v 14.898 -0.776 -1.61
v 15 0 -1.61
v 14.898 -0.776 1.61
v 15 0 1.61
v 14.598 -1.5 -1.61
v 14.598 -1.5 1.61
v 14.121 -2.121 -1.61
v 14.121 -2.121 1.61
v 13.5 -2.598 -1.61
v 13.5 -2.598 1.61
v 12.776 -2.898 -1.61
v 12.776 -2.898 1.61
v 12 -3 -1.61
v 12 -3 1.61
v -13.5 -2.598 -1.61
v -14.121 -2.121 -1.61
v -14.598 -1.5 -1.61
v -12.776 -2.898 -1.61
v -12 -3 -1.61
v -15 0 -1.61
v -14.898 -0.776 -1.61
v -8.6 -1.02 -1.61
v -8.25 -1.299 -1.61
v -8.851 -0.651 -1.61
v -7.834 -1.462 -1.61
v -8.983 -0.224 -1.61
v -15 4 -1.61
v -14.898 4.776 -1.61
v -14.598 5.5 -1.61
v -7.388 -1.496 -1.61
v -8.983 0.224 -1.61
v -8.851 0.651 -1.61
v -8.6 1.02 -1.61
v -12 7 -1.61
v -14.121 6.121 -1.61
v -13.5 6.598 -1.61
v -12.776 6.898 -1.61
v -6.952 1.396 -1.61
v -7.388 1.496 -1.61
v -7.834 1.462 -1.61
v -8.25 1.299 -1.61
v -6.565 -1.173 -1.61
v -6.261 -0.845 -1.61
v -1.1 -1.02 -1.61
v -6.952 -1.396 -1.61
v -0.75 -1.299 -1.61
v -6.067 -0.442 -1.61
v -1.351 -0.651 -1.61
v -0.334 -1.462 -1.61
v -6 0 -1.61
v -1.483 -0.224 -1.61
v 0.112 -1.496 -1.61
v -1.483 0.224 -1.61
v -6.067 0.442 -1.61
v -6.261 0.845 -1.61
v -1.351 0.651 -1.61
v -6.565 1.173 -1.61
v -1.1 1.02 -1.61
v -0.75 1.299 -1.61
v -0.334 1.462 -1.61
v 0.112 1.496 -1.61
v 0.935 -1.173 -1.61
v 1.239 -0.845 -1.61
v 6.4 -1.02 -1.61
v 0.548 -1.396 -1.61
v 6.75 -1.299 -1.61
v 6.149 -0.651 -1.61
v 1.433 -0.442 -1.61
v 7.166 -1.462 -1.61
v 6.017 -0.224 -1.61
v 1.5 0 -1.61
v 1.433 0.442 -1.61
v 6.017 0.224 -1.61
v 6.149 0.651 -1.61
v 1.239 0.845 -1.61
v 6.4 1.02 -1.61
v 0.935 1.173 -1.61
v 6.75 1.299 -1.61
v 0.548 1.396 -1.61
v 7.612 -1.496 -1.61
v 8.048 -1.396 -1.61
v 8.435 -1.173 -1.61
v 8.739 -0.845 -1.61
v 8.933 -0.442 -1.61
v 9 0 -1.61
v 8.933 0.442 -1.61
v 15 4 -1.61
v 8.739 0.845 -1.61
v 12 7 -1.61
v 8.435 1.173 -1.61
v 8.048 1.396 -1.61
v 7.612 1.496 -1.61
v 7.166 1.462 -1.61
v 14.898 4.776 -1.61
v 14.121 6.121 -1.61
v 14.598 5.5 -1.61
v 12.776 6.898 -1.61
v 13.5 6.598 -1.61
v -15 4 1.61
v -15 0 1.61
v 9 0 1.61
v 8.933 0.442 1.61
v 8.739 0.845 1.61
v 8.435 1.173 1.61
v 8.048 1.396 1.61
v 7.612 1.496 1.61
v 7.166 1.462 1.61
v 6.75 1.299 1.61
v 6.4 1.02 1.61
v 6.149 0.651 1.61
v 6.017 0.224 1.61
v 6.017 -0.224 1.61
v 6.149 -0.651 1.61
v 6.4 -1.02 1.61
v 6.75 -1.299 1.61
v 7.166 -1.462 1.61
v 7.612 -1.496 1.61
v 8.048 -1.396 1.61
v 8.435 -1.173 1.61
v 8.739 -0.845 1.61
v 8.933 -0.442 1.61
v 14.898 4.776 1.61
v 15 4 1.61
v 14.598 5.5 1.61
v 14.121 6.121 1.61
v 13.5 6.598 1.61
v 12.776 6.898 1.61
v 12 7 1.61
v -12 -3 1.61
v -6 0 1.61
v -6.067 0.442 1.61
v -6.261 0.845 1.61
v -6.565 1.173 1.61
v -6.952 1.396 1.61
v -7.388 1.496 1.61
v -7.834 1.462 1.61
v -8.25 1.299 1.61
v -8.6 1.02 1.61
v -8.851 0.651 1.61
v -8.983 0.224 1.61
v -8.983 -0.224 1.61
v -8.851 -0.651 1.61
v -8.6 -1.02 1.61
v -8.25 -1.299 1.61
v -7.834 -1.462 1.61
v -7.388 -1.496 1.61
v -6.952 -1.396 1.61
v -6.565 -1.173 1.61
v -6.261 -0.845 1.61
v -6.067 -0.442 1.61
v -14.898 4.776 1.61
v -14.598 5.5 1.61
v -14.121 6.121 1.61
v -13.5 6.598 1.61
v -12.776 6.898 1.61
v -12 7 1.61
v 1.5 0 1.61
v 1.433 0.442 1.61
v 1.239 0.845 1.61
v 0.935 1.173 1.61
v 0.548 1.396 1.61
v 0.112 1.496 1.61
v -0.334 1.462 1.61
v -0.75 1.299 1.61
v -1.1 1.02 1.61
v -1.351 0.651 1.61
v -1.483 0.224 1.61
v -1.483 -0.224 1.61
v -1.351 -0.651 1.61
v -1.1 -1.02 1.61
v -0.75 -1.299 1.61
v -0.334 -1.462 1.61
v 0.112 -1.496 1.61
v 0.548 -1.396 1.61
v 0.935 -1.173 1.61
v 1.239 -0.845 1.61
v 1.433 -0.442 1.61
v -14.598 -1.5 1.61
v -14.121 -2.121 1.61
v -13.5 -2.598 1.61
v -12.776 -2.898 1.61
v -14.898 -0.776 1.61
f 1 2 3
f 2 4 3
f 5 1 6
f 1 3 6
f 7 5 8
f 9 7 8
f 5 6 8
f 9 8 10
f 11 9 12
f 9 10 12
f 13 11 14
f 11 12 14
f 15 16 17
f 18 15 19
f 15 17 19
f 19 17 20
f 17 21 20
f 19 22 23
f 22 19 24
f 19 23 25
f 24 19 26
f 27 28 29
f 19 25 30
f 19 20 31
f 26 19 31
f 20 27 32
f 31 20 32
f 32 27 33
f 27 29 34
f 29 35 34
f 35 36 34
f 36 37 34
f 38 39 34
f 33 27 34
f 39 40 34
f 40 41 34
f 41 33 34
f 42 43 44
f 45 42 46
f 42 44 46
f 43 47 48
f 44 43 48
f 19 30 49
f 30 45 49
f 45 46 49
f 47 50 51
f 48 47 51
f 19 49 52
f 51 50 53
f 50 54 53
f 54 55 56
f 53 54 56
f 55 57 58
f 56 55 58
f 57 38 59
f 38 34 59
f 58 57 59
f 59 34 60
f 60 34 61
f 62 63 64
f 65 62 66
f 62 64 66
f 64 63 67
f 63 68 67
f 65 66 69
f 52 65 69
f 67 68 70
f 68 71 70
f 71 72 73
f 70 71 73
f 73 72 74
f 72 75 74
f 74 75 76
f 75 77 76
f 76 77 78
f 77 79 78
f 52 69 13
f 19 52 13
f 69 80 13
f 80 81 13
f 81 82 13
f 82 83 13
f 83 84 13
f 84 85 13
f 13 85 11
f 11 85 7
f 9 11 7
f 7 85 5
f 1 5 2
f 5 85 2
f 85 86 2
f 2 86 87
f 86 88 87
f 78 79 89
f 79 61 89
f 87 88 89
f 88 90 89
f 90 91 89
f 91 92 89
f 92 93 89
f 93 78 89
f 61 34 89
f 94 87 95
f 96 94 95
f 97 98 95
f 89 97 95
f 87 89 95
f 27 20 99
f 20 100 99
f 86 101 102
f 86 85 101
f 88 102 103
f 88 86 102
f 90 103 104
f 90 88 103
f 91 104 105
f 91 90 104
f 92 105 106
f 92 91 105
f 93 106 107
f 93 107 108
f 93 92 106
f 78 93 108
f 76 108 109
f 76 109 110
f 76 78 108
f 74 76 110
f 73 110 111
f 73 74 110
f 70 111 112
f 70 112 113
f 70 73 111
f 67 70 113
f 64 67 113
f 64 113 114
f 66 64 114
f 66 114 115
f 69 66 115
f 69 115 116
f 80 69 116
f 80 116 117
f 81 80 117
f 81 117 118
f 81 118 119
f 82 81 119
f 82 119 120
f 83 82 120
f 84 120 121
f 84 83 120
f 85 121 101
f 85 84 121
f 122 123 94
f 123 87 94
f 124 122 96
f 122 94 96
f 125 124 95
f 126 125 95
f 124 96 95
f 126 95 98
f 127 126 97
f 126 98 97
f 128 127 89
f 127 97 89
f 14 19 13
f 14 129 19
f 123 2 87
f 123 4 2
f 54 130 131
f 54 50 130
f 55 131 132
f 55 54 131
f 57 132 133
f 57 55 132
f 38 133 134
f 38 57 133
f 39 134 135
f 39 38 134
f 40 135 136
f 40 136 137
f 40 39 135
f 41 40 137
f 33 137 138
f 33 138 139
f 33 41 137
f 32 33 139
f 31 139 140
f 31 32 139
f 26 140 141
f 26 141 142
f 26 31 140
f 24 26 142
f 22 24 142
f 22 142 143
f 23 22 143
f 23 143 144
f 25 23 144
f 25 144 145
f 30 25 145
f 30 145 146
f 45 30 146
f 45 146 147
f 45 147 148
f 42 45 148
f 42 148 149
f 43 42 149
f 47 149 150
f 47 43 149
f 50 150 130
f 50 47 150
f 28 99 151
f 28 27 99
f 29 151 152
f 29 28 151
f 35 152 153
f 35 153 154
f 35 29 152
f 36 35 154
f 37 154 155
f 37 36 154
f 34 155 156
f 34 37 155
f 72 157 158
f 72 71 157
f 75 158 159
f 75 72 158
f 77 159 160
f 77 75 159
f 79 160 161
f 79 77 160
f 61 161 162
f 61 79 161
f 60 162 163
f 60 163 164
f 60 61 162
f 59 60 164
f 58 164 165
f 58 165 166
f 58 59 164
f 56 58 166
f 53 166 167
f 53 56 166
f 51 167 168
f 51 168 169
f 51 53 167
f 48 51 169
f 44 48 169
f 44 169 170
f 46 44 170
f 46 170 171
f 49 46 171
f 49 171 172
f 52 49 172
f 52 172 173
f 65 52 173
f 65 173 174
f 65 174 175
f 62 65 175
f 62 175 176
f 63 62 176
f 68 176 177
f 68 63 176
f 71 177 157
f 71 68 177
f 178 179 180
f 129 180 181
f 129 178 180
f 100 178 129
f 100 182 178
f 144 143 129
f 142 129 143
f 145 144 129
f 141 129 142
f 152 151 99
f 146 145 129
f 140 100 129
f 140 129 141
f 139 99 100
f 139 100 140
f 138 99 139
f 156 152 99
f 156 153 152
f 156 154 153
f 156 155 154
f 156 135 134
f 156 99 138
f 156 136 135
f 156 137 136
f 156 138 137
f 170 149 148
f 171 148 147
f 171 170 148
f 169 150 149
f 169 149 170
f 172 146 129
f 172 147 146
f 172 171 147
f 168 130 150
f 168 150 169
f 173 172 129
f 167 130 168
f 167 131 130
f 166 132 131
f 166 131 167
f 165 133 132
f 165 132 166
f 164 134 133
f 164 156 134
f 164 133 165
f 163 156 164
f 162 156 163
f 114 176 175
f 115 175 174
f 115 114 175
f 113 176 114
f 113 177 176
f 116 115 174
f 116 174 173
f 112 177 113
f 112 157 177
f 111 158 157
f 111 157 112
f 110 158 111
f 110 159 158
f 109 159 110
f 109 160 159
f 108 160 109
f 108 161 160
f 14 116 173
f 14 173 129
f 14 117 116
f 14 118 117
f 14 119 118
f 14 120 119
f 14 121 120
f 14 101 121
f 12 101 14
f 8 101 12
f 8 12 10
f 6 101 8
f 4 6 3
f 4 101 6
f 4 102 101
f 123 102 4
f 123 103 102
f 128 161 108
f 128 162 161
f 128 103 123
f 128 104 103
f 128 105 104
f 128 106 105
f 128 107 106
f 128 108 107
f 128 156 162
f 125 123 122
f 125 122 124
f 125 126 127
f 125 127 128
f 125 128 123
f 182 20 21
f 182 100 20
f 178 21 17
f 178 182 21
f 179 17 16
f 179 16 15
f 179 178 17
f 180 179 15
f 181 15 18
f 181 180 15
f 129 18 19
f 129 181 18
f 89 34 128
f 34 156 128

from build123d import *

# Parameters (mm, degrees)
SKETCH1_W           = 30
SKETCH1_H           = 10
SKETCH1_R           = 1.5
BOSS_EXTRUDE1_DEPTH = 1.61
FILLET1_R           = 3


with BuildPart() as part:
    # Sketch1 → Boss-Extrude1 (new body, symmetric)
    with BuildSketch(Plane.XY):
        with Locations((0, 2)):
            Rectangle(SKETCH1_W, SKETCH1_H)
        with Locations((-7.5, 0)):
            Circle(SKETCH1_R, mode=Mode.SUBTRACT)
        Circle(SKETCH1_R, mode=Mode.SUBTRACT)
        with Locations((7.5, 0)):
            Circle(SKETCH1_R, mode=Mode.SUBTRACT)
    extrude(amount=BOSS_EXTRUDE1_DEPTH, both=True)

    # Fillet1
    fillet1_edges = [part.edges().sort_by_distance(p)[0] for p in [
        (15, -3, 0),
        (-15, -3, 0),
        (-15, 7, 0),
        (15, 7, 0),
    ]]
    fillet(fillet1_edges, radius=FILLET1_R)


solid = part.part
